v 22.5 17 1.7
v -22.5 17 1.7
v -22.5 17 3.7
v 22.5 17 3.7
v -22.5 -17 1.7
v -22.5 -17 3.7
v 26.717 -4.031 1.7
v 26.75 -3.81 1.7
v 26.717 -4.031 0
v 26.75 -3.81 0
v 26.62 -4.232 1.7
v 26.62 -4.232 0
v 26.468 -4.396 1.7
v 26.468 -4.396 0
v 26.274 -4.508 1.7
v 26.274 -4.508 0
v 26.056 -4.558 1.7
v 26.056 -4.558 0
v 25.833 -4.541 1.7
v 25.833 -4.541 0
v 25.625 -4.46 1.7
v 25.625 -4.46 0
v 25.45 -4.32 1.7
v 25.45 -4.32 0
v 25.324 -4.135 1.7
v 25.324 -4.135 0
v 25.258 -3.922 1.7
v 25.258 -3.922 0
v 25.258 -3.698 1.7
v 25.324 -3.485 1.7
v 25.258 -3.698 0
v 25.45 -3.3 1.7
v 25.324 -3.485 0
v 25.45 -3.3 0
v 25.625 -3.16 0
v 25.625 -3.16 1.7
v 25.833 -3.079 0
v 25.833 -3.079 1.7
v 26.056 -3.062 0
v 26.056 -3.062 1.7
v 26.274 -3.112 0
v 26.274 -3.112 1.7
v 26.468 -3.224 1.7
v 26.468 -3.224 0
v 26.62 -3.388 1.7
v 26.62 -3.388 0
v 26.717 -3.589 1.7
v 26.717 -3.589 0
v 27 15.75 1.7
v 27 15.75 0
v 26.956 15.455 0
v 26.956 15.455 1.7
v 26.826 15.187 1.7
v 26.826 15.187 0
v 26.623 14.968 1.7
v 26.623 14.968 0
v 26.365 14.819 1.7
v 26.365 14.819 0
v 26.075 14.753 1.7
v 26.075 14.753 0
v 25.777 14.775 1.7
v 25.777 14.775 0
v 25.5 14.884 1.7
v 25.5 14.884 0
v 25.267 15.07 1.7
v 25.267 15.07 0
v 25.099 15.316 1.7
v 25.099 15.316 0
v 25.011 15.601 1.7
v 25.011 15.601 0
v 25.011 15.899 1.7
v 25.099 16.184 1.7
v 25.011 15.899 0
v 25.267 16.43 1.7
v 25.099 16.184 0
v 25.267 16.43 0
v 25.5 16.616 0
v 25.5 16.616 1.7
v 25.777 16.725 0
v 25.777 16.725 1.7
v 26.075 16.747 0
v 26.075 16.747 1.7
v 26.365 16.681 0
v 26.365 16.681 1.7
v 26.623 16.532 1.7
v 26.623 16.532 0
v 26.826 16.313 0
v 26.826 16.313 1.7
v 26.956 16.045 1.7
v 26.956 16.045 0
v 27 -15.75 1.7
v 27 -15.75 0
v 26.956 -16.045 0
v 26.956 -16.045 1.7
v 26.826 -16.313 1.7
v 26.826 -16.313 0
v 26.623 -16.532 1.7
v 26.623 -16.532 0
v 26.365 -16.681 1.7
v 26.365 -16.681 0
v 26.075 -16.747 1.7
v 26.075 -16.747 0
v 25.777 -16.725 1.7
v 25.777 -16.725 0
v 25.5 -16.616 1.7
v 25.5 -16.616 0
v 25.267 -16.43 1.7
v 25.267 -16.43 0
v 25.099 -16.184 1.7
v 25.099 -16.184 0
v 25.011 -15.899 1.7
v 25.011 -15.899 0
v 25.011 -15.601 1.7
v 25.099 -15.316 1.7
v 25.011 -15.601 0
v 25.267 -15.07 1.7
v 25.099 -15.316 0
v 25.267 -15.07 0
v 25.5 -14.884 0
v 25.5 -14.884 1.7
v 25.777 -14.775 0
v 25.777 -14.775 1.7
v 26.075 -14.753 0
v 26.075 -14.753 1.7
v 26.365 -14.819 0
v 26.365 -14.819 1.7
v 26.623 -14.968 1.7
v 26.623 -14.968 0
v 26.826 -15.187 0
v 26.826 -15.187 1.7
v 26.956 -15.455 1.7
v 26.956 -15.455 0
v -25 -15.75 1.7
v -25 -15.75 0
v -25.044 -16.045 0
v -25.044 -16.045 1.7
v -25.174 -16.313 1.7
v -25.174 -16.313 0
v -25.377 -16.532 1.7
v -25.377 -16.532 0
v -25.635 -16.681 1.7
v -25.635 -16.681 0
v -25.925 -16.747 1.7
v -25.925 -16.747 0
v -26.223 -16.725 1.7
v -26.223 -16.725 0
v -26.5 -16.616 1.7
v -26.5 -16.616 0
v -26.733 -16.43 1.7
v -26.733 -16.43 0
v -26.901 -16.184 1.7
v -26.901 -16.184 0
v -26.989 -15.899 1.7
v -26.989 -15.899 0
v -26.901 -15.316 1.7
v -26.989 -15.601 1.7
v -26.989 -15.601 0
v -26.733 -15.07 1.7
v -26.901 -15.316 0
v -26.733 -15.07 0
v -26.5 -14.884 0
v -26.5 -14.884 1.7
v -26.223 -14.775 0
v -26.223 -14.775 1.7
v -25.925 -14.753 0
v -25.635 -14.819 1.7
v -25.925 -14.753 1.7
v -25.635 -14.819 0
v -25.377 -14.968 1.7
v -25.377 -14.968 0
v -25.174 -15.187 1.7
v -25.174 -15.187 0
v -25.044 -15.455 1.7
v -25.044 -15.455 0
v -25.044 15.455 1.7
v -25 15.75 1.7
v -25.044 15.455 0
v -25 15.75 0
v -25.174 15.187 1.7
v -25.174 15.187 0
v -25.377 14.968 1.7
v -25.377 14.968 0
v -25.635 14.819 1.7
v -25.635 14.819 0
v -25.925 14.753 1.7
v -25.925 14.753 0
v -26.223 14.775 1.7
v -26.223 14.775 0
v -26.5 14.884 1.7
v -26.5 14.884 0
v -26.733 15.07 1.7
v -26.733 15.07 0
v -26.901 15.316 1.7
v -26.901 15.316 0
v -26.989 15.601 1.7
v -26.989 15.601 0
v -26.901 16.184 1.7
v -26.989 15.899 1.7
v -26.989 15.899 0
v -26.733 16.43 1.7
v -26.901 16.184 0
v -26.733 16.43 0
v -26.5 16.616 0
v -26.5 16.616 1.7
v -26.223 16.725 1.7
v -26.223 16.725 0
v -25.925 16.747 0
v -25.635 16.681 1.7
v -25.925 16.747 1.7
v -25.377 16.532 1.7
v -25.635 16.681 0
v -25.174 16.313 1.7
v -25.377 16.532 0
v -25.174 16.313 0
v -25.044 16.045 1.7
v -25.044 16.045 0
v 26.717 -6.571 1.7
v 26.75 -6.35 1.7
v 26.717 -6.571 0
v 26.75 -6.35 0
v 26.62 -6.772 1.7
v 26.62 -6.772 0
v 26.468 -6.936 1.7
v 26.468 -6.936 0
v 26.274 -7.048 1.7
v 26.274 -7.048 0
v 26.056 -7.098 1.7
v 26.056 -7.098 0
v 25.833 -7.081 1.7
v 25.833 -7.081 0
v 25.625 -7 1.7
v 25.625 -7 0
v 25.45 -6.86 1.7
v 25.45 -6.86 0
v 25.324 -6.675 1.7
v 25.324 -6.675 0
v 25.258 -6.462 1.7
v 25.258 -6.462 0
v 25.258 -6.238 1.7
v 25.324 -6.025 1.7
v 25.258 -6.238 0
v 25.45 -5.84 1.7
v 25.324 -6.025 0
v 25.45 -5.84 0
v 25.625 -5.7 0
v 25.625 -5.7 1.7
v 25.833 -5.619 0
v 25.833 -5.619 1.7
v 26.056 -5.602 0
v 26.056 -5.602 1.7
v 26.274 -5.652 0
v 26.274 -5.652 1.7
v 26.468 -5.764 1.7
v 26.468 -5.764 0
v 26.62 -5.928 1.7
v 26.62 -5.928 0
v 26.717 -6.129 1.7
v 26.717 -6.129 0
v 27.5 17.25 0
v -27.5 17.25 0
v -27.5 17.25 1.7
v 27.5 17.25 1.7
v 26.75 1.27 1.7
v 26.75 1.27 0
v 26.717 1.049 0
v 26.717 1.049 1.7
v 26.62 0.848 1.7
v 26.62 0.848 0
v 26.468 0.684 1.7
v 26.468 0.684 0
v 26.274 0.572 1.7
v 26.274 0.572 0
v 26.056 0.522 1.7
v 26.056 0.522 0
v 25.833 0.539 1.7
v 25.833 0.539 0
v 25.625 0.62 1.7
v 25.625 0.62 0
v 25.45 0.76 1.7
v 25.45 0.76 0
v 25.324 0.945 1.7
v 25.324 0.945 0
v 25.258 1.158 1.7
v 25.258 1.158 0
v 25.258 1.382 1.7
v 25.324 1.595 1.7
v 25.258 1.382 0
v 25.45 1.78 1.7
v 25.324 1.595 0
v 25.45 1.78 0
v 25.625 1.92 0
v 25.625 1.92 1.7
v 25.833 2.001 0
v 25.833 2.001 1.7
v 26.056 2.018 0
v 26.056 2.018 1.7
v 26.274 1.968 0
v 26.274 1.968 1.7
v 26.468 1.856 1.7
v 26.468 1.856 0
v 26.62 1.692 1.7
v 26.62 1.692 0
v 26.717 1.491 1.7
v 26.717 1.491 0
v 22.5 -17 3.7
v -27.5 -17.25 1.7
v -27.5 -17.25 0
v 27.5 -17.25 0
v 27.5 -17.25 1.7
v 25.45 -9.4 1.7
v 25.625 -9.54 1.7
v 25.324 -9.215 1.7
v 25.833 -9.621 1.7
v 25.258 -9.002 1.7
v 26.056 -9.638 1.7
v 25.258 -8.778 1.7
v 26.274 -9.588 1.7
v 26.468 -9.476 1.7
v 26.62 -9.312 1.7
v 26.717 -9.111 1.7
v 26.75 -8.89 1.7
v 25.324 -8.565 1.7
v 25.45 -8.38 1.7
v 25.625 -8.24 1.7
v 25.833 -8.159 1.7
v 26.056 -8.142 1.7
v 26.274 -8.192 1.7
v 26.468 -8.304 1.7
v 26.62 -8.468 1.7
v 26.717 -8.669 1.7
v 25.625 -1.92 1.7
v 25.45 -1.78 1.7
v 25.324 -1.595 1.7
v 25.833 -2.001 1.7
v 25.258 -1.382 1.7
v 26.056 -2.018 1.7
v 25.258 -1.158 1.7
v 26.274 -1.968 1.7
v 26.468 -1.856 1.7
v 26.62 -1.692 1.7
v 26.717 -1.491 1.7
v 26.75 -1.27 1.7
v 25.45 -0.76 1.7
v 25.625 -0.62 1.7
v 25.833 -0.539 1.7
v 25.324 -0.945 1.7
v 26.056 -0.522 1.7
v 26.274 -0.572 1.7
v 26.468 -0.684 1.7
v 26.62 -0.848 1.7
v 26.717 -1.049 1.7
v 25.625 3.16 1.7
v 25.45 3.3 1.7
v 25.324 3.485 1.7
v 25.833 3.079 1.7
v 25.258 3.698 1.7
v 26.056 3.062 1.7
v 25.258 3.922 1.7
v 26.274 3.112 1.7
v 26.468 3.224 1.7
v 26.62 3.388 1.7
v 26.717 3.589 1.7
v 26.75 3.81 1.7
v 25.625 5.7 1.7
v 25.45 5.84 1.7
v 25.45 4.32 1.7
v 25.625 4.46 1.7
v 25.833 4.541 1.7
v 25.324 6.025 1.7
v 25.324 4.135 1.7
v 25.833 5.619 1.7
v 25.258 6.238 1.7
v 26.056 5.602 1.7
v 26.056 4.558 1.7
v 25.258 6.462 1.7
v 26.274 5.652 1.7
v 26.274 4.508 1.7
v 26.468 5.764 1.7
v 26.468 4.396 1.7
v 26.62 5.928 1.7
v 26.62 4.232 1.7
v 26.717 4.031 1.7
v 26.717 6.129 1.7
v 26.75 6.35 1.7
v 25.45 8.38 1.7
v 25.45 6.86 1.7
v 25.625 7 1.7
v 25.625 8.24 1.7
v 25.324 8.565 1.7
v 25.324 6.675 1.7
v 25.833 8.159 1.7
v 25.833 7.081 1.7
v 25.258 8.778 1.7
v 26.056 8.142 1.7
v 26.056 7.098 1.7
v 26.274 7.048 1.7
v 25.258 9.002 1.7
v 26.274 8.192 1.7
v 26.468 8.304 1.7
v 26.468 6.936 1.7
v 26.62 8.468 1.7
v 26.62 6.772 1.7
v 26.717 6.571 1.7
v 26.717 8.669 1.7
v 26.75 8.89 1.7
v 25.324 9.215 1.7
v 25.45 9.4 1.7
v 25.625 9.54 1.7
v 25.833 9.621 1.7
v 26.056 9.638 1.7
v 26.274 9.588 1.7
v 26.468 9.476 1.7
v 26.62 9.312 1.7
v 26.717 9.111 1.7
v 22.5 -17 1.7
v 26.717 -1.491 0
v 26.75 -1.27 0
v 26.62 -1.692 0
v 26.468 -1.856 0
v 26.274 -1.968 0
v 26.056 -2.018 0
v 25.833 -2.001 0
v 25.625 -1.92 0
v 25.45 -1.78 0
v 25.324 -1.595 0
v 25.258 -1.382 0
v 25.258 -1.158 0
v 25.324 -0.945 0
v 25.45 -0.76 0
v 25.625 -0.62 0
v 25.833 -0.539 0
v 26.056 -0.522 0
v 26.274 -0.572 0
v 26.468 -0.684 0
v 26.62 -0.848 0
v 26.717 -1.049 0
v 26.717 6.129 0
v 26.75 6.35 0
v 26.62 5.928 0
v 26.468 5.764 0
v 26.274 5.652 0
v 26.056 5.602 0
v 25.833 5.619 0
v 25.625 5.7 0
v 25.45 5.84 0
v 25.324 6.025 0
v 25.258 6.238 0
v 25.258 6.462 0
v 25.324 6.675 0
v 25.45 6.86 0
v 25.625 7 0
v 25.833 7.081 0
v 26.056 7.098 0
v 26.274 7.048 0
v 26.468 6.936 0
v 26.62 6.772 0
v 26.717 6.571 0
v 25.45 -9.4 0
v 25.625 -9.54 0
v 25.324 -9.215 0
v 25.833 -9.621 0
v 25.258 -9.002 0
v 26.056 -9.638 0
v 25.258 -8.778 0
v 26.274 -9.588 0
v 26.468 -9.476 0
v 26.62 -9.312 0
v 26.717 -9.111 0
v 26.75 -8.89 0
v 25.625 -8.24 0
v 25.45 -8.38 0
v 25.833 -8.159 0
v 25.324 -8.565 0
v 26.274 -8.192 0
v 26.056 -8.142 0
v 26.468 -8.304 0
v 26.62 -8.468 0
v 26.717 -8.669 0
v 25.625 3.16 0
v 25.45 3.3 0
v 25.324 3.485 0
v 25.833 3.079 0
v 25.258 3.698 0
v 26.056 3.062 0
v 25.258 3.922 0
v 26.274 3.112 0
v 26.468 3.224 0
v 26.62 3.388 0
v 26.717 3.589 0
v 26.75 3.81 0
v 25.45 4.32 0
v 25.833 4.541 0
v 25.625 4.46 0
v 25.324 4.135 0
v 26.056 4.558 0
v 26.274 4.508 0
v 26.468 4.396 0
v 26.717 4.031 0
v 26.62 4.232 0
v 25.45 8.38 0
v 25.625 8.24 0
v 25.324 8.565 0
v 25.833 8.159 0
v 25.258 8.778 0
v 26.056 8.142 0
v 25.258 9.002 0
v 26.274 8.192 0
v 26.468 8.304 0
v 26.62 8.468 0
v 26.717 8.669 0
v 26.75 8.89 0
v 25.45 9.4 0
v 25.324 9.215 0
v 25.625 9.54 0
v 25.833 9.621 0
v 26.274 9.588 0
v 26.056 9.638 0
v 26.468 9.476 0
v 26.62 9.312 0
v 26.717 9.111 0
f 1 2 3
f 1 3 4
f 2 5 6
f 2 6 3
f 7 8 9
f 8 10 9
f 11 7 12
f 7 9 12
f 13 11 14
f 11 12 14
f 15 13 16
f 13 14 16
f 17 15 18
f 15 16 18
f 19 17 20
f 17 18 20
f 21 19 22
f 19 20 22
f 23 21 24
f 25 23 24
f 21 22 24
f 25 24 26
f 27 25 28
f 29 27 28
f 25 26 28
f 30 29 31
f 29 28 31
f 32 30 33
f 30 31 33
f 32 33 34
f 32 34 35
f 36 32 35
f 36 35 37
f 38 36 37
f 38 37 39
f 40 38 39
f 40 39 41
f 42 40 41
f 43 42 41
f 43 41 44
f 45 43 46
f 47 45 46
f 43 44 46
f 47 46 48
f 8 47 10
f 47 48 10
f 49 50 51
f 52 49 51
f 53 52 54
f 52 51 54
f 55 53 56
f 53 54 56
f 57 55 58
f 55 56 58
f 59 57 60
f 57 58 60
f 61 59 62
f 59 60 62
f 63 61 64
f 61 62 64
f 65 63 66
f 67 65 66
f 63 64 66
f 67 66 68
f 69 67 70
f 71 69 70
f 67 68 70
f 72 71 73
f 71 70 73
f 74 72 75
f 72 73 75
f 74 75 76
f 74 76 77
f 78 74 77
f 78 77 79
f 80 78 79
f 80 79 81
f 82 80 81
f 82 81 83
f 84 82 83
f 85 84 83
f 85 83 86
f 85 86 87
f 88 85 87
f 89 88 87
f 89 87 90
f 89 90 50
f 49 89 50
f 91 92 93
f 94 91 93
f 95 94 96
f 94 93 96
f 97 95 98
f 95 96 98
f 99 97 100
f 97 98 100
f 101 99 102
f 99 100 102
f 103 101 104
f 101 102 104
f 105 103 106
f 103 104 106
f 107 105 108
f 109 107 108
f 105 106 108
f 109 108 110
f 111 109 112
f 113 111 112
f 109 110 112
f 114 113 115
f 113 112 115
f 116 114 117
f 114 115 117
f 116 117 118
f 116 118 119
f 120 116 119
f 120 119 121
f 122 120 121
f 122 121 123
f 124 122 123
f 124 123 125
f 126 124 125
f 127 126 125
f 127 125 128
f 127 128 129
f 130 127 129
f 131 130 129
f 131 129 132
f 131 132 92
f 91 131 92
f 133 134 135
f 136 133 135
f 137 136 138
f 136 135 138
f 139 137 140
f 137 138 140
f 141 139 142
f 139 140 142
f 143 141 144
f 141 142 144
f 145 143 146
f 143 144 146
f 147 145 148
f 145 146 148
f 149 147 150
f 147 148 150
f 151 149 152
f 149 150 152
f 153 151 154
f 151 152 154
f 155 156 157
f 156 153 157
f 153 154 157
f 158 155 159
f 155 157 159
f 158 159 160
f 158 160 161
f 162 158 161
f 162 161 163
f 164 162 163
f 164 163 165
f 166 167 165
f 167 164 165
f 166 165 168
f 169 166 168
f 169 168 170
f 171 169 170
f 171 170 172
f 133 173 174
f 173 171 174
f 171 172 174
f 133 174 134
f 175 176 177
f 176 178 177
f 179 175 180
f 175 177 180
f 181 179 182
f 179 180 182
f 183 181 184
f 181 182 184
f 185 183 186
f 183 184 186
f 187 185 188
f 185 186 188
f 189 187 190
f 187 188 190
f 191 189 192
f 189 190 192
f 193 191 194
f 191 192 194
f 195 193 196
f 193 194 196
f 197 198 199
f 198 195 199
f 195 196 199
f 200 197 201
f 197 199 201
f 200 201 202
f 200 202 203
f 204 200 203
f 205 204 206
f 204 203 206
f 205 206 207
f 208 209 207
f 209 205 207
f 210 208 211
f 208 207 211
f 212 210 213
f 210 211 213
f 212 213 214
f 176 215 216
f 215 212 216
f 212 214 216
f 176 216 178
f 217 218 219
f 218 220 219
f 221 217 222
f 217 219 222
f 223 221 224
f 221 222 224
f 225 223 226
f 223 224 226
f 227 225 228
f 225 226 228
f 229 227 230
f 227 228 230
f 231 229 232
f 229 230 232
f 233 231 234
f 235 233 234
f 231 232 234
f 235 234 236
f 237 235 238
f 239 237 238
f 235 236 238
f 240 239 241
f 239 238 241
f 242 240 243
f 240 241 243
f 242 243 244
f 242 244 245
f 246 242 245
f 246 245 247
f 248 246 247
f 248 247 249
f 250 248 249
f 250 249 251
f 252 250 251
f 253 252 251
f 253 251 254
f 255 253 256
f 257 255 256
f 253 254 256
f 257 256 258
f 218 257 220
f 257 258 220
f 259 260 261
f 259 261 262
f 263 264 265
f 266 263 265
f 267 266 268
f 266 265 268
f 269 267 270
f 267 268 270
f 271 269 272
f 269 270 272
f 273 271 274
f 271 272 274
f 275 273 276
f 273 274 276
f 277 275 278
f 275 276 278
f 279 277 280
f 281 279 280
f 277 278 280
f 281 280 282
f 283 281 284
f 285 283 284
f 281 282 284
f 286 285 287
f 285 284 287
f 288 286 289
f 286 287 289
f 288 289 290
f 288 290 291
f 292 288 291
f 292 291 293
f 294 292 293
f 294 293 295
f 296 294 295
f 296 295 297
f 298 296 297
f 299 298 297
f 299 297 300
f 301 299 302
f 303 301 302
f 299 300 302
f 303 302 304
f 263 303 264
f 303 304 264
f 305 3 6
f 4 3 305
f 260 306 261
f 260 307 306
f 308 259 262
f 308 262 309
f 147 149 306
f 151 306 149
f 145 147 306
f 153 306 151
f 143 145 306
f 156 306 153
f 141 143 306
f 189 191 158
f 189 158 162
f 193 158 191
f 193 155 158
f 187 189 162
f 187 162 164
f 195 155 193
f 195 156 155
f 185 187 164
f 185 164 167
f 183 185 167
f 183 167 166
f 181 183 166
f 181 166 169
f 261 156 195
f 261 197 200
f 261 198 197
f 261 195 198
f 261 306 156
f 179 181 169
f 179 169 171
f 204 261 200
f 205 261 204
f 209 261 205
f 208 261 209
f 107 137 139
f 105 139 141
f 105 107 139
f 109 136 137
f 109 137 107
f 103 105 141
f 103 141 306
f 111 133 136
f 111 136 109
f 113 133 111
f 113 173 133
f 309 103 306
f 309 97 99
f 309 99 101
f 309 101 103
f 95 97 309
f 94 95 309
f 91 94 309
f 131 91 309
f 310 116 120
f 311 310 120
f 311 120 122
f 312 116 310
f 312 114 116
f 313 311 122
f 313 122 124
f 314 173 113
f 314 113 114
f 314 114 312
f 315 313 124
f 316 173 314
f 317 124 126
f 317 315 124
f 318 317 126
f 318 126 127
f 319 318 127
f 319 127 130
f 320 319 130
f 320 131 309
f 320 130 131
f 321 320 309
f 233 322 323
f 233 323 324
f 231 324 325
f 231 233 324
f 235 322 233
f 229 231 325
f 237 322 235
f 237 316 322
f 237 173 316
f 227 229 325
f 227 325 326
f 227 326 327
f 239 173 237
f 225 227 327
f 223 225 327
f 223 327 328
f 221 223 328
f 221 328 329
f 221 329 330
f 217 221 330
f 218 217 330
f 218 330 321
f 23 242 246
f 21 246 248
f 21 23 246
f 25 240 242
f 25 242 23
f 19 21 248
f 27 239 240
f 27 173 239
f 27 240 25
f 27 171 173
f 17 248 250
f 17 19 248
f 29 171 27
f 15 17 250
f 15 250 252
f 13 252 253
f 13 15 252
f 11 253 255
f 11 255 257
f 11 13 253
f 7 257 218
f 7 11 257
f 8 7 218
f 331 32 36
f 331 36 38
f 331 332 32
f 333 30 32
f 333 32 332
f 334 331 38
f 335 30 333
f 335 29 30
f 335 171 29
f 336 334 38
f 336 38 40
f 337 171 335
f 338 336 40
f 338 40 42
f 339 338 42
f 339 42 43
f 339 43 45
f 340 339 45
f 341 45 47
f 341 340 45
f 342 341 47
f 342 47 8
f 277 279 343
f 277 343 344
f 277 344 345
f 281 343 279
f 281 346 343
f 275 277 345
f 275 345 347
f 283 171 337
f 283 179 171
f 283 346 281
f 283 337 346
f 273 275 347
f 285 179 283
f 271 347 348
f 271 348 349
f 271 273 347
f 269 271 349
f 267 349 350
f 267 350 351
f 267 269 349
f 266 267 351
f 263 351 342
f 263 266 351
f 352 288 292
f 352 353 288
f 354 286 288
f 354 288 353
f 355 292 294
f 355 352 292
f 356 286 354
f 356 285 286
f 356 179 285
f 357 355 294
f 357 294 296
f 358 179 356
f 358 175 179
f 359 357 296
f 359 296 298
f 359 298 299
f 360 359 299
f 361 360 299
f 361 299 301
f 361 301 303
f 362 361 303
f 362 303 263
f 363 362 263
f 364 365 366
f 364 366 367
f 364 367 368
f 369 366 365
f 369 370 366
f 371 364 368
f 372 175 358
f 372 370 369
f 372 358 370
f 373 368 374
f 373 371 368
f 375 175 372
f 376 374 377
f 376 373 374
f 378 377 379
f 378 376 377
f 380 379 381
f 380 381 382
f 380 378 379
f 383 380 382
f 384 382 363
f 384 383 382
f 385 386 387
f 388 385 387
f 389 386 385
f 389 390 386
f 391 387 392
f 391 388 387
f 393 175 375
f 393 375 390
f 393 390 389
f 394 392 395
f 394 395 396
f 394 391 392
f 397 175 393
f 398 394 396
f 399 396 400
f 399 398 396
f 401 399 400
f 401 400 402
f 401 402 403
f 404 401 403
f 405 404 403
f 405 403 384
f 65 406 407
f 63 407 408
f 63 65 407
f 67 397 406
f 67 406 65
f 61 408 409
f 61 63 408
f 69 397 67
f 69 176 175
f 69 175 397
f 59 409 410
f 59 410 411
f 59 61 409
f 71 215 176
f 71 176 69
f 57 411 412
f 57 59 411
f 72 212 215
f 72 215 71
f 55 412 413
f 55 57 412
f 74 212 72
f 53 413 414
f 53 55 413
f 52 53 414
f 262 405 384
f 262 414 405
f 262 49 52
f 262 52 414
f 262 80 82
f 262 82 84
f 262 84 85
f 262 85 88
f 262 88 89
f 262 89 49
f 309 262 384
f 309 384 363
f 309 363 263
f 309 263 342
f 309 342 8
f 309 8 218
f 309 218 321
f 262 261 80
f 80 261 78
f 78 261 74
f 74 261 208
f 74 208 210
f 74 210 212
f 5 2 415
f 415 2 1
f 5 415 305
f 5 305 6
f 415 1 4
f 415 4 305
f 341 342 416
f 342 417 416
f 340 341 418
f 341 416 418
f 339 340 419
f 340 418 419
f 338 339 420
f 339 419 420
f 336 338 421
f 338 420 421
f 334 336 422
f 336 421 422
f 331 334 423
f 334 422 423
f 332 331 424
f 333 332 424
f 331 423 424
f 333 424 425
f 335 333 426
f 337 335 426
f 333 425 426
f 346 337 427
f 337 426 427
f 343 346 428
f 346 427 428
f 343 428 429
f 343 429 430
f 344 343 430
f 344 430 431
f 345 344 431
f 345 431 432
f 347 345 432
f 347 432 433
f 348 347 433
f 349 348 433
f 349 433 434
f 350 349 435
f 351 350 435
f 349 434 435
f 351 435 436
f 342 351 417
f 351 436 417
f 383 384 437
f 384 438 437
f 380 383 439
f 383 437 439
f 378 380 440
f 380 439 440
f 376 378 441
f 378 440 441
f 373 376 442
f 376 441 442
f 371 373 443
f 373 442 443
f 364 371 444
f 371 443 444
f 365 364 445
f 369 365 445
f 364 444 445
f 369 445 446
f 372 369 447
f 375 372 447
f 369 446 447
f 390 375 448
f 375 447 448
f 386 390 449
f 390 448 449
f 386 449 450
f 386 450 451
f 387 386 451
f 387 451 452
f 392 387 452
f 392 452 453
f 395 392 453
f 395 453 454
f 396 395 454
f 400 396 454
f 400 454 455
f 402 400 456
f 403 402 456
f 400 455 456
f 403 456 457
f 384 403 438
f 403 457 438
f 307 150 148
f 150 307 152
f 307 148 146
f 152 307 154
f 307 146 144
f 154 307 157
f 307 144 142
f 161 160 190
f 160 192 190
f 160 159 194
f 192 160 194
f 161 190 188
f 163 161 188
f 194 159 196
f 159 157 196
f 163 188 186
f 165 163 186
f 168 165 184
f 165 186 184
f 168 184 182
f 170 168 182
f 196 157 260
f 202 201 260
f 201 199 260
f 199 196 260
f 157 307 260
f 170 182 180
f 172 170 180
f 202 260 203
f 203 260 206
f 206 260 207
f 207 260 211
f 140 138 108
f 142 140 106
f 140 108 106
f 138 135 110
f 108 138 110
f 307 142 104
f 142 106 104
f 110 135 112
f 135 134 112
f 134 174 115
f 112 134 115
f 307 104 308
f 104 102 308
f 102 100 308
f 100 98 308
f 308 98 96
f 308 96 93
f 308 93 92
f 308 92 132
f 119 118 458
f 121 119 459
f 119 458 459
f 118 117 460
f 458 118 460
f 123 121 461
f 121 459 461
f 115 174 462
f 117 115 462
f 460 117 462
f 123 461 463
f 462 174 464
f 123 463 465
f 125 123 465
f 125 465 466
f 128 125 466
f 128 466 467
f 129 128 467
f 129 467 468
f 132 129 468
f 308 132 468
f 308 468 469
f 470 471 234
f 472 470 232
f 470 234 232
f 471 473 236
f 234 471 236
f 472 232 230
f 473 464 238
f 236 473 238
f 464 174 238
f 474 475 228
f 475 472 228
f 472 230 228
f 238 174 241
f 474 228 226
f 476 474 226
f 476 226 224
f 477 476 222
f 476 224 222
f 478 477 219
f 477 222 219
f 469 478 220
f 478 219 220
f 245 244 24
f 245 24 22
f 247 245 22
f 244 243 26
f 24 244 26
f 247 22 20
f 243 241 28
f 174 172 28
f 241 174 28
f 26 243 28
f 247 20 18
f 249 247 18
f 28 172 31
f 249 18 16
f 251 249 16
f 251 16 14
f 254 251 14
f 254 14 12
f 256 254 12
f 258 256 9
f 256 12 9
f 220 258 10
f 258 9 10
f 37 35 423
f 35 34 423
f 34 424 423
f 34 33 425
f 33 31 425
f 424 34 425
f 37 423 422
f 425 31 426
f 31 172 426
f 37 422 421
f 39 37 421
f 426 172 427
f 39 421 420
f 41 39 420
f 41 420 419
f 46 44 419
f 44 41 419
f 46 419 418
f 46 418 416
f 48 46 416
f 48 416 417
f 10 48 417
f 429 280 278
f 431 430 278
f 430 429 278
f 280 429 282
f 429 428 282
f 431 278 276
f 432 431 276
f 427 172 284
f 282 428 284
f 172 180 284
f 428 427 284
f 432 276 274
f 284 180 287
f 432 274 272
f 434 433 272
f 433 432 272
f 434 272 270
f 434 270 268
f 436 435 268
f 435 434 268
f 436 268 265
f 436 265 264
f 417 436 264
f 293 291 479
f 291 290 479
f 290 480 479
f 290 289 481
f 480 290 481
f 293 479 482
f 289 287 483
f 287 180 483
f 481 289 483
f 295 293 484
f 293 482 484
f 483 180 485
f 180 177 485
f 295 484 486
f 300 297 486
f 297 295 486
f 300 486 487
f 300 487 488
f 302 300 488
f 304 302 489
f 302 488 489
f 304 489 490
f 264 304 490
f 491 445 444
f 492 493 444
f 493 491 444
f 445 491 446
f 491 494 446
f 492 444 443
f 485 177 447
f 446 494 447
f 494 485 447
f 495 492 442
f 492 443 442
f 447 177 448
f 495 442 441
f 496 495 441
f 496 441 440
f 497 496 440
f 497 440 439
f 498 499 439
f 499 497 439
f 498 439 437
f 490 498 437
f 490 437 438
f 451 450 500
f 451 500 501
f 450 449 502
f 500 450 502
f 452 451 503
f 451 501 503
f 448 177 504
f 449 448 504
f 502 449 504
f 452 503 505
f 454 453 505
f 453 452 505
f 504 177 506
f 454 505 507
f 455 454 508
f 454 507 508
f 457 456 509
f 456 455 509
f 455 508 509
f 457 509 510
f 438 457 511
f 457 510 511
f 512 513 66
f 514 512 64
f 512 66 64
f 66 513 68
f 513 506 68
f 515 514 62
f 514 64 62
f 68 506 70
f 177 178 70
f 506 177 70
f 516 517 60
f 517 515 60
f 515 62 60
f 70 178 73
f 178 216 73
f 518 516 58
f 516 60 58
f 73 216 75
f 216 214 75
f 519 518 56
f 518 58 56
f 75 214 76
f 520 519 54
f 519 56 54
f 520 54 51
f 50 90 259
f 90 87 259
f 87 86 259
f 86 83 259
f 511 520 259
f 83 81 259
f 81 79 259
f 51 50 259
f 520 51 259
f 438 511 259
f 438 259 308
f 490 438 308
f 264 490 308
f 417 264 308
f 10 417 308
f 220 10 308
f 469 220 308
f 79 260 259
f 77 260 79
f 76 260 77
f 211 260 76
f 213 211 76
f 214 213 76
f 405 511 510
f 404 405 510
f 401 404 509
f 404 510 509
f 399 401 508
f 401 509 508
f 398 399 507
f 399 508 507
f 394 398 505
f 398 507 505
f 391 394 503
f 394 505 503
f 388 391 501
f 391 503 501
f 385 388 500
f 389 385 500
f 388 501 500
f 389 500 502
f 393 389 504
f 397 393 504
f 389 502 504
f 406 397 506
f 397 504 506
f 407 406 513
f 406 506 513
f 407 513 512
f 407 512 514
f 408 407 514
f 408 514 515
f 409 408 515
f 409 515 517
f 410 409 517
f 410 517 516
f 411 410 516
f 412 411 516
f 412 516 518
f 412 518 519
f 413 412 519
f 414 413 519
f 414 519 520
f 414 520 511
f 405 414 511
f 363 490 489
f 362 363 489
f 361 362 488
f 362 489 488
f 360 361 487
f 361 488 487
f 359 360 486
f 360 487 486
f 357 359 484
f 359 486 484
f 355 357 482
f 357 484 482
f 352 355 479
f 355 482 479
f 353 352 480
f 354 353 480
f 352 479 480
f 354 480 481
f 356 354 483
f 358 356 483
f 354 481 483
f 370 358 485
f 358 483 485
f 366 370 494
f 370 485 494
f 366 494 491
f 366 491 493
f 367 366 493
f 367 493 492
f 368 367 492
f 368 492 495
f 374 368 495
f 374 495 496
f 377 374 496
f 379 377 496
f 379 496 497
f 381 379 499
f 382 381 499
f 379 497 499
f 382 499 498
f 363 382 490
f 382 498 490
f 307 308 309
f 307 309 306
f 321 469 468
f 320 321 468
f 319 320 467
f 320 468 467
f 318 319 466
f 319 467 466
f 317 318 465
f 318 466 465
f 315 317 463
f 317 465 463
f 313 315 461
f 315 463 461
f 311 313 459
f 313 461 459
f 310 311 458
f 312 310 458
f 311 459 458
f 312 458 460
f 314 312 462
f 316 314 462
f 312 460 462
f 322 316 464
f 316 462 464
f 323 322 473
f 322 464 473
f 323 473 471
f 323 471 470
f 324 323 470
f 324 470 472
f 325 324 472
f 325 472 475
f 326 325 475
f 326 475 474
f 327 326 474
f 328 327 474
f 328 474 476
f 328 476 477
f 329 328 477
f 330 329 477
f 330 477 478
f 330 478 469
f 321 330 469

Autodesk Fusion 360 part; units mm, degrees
sketch "Sketch1" plane through (0, 0, 0) normal (0, 0, 1) x (1, 0, 0)
  line L0 (27.5, -17.25) -> (-27.5, -17.25)
  line L1 (-27.5, -17.25) -> (-27.5, 17.25)
  line L2 (-27.5, 17.25) -> (27.5, 17.25)
  line L3 (27.5, 17.25) -> (27.5, -17.25)
  line L4 (27.5, -17.25) -> (-27.5, 17.25) construction
  line L5 (-27.5, -17.25) -> (27.5, 17.25) construction
  line L6 (22.5, -17) -> (-22.5, -17)
  line L7 (-22.5, -17) -> (-22.5, 17)
  line L8 (-22.5, 17) -> (22.5, 17)
  line L9 (22.5, 17) -> (22.5, -17)
  line L10 (22.5, -17) -> (-22.5, 17) construction
  line L11 (-22.5, -17) -> (22.5, 17) construction
  circle A0 centre (26, 15.75) radius 1
  line L12 (0, 17.25) -> (0, -17.25) construction
  line L13 (27.5, 0) -> (-27.5, 0) construction
  circle A1 centre (-26, 15.75) radius 1
  circle A2 centre (-26, -15.75) radius 1
  circle A3 centre (26, -15.75) radius 1
  circle A4 centre (26, 1.27) radius 0.75
  circle A5 centre (26, 3.81) radius 0.75
  circle A6 centre (26, 6.35) radius 0.75
  circle A7 centre (26, 8.89) radius 0.75
  line L14 (26, 17.25) -> (26, -17.25)
  circle A8 centre (26, -1.27) radius 0.75
  circle A9 centre (26, -3.81) radius 0.75
  circle A10 centre (26, -6.35) radius 0.75
  circle A11 centre (26, -8.89) radius 0.75
  point P0 (25.0526, 0)
  dimension "d29" = 34.5
  dimension "d30" = 55
  dimension "d31" = 45
  dimension "d32" = 34
  dimension "d33" = 2
  dimension "d34" = 1.5
  dimension "d35" = 1.5
  dimension "d37" = 1.5
  dimension "d41" = 0
  dimension "d42" = 2.54
  dimension "d43" = 1.27
  dimension "d44" = 1.5
extrude "Extrude1" add sketch "Sketch1" along normal blind 1.7 contours L0 L2 L3 A0 A3 A4 A5 A6 A7 L14 A8 A9 A10 A11 | L0 L1 L2 A0 A3 A4 A5 A6 A7 L14 A8 A9 A10 A11 | L6 L7 L8 L9 makes body 1
extrude "Extrude2" add sketch "Sketch1" along normal blind 2 from surface at 1.7 separate body contours L6 L7 L8 L9 makes body 2
equation "d35 = d34"
equation "d37 = d36"
equation "d36 = 1.5 mm"
